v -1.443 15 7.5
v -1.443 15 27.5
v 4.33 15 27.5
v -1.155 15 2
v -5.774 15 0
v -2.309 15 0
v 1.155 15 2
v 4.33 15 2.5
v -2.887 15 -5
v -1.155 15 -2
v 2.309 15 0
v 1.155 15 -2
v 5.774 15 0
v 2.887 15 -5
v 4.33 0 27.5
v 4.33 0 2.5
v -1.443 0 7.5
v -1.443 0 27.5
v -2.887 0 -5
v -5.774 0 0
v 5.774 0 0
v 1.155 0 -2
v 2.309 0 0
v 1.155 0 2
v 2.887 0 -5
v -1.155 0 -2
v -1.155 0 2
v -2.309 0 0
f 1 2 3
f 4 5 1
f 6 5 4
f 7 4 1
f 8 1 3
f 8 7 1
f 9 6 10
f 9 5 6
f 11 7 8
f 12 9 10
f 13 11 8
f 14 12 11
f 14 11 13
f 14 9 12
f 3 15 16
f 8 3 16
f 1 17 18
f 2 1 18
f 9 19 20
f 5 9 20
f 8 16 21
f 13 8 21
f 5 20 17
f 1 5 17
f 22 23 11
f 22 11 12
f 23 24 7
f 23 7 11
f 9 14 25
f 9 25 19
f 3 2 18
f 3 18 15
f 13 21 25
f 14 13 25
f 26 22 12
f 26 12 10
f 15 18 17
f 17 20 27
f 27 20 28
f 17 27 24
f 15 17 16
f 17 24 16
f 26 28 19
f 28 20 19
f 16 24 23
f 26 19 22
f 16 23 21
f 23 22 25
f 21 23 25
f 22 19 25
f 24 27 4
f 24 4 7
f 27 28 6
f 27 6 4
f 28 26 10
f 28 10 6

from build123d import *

# Parameters (mm, degrees)
BOSS_EXTRUDE1_DEPTH = 15


with BuildPart() as part:
    # Sketch1 → Boss-Extrude1 (new body)
    with BuildSketch(Plane(origin=(0, 0, 0), x_dir=(1, 0, 0), z_dir=(0, 1, 0))):
        Polygon((-1.443375673, -7.5), (-1.443375673, -27.5), (4.330127019, -27.5), (4.330127019, -2.5), (5.773502692, 0), (2.886751346, 5), (-2.886751346, 5), (-5.773502692, 0), align=None)
        Polygon((2.309401077, 0), (1.154700538, 2), (-1.154700538, 2), (-2.309401077, 0), (-1.154700538, -2), (1.154700538, -2), align=None, mode=Mode.SUBTRACT)
    extrude(amount=BOSS_EXTRUDE1_DEPTH)


solid = part.part
